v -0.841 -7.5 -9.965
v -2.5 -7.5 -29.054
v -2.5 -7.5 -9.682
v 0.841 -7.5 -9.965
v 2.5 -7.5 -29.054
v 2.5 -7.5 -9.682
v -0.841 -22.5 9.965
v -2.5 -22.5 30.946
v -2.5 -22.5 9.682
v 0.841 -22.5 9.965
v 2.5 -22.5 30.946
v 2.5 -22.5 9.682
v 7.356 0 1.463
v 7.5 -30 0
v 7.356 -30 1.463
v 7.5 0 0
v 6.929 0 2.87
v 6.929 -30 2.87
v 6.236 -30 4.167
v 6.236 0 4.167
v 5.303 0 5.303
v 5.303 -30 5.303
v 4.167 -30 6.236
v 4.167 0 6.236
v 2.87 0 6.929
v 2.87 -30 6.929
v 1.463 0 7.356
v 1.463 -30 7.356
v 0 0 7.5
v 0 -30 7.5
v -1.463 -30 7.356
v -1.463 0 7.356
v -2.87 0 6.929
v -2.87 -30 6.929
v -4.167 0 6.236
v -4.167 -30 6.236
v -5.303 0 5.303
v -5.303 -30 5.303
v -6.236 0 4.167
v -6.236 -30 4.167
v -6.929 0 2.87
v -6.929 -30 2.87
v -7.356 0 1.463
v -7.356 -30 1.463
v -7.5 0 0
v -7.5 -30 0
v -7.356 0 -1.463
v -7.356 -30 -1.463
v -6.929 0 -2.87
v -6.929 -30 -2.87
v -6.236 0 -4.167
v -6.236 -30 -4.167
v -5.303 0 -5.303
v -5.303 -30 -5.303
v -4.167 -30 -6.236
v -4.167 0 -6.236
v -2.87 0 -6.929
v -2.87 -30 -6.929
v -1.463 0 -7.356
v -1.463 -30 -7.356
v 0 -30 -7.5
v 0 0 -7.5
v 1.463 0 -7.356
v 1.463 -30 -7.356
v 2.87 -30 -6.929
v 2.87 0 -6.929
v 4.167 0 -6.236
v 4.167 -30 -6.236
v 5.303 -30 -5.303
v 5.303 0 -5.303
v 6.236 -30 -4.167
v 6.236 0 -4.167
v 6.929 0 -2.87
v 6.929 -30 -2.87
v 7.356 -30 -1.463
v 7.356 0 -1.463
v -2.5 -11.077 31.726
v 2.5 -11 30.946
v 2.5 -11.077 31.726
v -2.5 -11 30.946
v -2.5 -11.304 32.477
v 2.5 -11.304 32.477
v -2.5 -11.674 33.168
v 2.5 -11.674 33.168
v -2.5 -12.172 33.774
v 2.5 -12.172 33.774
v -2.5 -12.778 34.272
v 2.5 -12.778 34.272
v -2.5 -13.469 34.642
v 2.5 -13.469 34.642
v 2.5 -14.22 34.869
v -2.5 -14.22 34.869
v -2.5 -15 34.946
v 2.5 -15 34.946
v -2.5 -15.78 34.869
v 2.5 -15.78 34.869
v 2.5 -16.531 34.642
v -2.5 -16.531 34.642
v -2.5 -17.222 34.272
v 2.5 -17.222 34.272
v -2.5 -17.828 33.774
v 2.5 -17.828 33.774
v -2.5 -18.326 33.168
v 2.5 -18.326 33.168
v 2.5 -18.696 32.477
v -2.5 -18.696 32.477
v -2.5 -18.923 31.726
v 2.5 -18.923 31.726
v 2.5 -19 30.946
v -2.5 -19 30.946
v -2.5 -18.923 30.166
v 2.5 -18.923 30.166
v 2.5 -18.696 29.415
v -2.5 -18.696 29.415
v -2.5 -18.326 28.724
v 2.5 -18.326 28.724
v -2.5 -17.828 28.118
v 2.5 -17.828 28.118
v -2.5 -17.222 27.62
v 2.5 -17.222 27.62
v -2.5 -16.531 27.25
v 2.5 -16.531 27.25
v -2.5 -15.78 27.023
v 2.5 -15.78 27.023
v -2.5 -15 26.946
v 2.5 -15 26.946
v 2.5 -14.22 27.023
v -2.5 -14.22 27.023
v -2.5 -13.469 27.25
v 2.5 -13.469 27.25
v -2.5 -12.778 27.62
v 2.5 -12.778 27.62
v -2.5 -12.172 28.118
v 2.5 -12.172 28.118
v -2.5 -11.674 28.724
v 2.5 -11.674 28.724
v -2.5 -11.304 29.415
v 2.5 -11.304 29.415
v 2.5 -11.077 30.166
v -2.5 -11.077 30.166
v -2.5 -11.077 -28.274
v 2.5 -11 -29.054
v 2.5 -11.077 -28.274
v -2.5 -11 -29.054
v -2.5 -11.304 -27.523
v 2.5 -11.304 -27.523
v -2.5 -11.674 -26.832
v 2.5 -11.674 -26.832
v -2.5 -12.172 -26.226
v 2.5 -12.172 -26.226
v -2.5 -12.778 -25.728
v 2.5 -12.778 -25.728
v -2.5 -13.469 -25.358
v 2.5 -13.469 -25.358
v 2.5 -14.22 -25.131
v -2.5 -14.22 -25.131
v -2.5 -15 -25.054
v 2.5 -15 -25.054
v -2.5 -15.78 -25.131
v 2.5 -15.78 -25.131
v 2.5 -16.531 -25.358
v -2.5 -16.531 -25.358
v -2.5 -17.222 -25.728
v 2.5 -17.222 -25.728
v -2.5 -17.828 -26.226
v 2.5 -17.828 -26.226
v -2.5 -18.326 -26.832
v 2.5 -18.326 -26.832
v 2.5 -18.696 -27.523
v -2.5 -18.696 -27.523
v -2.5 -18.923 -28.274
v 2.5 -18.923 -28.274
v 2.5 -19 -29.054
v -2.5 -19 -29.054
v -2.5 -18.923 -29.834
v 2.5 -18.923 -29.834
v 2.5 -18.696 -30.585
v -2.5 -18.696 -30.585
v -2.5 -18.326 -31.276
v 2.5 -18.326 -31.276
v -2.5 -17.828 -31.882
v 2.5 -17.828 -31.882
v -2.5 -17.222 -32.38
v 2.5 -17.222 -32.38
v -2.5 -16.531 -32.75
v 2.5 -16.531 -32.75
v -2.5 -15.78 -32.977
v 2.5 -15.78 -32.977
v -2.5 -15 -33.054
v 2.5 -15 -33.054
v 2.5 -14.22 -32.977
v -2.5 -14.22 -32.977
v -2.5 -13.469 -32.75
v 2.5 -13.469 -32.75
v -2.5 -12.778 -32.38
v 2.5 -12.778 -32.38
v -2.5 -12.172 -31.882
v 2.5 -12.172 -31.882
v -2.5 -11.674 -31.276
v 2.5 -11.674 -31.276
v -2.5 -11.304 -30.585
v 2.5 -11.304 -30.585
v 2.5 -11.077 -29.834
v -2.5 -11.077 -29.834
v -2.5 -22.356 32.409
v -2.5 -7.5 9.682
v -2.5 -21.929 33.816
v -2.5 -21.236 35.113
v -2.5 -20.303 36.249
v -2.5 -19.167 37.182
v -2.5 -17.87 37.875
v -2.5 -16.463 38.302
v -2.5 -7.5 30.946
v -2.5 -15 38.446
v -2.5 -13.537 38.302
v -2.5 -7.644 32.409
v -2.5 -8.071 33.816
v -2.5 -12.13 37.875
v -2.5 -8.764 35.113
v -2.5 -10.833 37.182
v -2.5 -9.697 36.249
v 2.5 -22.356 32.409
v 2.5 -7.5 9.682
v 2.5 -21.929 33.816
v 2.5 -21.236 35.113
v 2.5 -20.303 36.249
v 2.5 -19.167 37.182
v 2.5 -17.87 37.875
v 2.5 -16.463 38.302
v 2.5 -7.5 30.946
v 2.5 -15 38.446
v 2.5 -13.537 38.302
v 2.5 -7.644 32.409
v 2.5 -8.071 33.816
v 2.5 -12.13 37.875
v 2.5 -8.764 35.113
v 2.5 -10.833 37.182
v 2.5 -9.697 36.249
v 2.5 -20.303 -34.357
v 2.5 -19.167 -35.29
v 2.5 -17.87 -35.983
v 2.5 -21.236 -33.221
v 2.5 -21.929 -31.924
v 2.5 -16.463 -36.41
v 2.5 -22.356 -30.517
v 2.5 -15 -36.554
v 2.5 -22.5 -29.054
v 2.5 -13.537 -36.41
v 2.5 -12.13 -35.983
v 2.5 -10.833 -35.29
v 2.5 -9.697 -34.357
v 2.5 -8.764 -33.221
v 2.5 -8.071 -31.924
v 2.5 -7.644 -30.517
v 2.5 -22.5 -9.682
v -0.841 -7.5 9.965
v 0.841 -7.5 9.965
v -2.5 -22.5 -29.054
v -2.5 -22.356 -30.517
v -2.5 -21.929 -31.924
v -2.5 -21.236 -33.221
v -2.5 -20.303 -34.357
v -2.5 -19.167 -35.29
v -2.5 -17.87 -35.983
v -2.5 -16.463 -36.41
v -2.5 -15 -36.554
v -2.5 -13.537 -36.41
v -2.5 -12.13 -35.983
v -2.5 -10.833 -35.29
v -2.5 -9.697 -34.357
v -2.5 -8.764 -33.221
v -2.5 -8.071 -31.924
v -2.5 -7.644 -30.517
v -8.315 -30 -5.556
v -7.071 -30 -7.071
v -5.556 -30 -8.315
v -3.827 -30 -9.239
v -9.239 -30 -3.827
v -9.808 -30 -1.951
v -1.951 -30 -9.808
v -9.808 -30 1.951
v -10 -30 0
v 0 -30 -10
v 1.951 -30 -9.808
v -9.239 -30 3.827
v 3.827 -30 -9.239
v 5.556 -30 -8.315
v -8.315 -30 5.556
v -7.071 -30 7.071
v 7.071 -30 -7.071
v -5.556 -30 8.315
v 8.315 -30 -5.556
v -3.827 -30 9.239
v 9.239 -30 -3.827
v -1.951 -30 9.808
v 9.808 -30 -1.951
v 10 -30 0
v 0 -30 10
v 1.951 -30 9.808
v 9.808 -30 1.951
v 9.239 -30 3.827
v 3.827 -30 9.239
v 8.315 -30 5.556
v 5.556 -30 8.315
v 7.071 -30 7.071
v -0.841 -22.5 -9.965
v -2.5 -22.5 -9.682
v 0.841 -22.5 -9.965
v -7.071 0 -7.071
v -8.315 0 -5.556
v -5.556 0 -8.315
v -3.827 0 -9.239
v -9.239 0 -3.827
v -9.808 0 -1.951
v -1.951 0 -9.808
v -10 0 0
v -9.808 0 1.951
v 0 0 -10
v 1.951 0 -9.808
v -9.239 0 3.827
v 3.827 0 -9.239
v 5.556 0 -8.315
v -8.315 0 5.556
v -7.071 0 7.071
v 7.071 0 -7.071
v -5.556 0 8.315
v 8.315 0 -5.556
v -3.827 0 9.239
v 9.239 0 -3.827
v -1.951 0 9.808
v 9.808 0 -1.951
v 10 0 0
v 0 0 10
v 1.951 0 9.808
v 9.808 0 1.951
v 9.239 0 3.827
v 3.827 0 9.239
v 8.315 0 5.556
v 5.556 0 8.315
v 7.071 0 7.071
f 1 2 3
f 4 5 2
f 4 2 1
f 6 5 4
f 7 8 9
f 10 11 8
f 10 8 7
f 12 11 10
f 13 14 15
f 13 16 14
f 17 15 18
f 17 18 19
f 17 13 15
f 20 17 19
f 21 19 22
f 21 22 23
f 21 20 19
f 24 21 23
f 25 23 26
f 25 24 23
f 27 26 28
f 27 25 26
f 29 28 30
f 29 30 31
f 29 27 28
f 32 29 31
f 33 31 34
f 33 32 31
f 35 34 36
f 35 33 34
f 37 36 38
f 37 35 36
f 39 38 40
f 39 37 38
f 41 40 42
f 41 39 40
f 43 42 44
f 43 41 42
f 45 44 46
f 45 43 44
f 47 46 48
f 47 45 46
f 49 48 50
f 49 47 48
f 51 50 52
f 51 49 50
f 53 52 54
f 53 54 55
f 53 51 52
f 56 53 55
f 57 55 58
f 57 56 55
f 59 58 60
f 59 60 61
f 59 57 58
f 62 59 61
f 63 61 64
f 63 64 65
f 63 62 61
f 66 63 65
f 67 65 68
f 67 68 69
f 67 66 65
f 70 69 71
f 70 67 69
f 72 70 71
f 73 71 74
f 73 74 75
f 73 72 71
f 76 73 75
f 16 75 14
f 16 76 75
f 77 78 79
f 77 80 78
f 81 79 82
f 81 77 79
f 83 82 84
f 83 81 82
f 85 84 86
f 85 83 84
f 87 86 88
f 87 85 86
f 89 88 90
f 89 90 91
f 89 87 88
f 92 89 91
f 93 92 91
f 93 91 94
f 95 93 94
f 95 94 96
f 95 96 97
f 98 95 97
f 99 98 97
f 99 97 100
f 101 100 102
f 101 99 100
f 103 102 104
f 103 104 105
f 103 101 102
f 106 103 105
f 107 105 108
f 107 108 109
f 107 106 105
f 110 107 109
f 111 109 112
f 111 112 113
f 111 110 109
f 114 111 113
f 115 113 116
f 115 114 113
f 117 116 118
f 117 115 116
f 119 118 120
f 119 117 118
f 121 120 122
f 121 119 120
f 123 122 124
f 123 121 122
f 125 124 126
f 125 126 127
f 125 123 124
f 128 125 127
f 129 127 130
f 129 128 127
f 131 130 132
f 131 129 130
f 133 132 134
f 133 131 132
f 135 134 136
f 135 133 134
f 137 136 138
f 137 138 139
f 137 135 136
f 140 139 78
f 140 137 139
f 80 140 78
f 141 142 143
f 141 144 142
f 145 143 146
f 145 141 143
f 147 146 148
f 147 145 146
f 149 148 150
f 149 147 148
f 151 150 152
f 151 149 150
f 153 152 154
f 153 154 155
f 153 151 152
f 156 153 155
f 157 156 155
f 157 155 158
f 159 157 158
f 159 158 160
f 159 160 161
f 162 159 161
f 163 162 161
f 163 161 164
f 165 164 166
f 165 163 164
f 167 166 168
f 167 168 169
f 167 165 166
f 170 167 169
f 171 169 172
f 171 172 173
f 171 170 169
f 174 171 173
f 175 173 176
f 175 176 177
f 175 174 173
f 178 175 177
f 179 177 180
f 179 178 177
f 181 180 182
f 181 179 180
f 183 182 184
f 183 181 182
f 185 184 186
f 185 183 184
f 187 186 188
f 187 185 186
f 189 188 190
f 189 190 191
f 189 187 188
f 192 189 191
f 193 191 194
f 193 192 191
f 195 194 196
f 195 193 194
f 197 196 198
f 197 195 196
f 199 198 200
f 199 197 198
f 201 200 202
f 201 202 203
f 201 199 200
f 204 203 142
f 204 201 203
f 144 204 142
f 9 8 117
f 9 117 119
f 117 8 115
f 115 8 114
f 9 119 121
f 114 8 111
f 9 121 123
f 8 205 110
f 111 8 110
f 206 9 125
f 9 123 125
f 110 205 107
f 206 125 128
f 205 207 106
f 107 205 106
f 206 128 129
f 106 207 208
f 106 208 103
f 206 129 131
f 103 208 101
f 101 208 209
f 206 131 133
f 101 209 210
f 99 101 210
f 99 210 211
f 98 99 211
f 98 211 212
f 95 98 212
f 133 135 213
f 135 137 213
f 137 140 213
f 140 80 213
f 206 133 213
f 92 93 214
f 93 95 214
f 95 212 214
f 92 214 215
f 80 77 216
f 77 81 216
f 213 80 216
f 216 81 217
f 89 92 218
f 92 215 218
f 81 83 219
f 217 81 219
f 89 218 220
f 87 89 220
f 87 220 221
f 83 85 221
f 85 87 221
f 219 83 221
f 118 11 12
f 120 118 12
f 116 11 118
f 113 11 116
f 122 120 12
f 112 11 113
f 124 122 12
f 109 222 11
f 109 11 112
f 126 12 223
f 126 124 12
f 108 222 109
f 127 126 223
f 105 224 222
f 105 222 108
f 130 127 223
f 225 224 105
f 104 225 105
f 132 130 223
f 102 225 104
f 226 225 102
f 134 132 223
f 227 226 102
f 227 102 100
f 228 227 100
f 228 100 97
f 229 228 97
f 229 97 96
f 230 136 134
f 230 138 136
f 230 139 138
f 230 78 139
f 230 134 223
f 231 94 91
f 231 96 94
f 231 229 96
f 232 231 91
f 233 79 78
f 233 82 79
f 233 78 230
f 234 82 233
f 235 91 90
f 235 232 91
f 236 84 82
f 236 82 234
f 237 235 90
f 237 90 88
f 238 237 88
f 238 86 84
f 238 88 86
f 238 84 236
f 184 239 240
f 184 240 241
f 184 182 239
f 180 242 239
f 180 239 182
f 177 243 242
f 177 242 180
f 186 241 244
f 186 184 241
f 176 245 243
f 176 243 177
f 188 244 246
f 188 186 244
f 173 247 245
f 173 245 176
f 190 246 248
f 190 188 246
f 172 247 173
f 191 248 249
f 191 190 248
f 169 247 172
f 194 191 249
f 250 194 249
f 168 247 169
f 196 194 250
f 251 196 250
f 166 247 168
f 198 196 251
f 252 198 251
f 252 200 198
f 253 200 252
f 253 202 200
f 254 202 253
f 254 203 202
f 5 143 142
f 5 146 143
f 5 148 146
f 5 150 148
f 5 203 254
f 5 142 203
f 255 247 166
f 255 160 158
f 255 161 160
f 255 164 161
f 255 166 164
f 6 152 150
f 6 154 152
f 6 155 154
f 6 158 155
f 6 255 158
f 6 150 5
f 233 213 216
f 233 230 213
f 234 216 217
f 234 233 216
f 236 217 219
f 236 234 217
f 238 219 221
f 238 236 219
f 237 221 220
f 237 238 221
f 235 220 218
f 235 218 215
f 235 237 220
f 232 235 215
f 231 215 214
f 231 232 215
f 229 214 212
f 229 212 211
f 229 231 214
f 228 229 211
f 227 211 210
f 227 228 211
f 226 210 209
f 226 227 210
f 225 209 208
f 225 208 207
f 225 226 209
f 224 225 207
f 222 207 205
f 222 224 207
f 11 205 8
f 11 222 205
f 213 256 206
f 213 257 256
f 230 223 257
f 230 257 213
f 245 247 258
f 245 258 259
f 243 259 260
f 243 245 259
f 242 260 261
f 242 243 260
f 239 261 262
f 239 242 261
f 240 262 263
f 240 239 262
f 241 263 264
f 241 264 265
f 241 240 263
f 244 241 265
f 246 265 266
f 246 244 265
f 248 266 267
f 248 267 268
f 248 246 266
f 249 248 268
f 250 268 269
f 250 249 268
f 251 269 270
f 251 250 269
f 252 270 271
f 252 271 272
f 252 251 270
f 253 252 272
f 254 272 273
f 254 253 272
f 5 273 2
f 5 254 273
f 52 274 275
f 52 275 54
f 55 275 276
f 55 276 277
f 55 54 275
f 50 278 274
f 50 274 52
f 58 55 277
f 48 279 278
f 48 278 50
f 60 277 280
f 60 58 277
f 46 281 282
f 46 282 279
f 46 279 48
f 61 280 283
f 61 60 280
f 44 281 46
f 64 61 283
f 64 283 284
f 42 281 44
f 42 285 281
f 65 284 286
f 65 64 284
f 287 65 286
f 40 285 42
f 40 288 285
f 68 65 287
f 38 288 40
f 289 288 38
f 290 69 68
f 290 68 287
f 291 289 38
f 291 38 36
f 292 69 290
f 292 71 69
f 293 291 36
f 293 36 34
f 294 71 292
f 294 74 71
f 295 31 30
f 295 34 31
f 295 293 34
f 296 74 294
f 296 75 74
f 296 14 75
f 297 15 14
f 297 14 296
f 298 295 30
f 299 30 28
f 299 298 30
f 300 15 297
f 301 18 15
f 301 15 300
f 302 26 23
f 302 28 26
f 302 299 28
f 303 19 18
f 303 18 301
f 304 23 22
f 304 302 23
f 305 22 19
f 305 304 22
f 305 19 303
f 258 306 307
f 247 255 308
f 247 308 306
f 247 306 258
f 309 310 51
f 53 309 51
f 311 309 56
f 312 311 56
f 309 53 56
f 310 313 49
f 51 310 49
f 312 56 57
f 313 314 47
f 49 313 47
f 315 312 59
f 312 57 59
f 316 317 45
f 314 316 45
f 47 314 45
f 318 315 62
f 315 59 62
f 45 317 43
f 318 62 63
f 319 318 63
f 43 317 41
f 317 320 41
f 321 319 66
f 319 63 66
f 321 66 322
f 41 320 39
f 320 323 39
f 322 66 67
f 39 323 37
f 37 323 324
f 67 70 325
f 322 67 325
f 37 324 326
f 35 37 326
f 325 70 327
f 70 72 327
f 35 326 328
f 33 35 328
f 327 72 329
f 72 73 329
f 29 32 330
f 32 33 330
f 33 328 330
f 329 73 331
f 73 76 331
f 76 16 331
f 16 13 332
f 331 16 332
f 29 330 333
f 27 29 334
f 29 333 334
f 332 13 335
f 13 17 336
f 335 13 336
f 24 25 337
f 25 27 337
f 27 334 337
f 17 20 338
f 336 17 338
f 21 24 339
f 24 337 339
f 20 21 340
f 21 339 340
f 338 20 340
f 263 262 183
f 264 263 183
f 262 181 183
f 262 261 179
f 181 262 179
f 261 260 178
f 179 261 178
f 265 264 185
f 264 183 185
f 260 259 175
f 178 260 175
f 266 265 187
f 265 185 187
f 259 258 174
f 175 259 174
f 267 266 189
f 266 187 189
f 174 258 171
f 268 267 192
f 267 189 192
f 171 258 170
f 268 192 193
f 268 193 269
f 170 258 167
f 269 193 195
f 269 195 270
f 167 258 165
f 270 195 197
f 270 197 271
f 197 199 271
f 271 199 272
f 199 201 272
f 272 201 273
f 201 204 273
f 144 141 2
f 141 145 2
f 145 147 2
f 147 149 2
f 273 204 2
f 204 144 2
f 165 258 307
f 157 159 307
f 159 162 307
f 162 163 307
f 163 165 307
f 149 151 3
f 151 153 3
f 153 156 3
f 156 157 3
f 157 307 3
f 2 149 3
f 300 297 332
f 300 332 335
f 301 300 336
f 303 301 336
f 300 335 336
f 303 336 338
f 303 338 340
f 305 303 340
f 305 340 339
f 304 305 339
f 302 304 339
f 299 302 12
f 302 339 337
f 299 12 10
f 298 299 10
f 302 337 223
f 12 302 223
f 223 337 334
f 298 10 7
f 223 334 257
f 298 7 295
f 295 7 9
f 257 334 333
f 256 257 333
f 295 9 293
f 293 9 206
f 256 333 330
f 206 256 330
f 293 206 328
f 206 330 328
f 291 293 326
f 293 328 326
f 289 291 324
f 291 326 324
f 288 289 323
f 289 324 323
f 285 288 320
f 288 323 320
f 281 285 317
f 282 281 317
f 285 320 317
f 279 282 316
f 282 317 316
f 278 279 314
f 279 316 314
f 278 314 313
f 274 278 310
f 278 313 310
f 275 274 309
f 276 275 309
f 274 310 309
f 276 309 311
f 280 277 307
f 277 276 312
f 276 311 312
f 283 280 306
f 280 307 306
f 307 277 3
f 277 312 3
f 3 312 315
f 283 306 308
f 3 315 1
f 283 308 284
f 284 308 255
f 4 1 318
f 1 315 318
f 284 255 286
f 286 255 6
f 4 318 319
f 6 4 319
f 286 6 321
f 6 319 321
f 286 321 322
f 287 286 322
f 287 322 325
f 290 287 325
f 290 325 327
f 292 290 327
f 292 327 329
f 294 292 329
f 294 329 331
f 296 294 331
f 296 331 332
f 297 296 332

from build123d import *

# Parameters (mm, degrees)
F0_R     = 10
F0_R_2   = 7.5
F1_DEPTH = 30
F2_R     = 4
F3_DEPTH = 2.5
F4_R     = 7.5
F5_DEPTH = 30.001


with BuildPart() as f1:
    # F0 (on Front) → F1 (new body)
    with BuildSketch(Plane.XZ):
        Circle(F0_R)
        Circle(F0_R_2, mode=Mode.SUBTRACT)
    extrude(amount=F1_DEPTH)

    # F2 (on Right) → F3 (join, symmetric)
    with BuildSketch(Plane.YZ):
        with BuildLine():
            Line((-22.5, 0.945997), (-7.5, 0.945997))
            Line((-7.5, 0.945997), (-7.5, 30.945997))
            ThreePointArc((-7.5, 30.945997), (-15, 38.445997), (-22.5, 30.945997))
            Line((-22.5, 30.945997), (-22.5, 0.945997))
        make_face()
        with Locations((-15, 30.945997)):
            Circle(F2_R, mode=Mode.SUBTRACT)
        with BuildLine():
            Line((-7.5, -29.054003), (-7.5, 0.945997))
            Line((-7.5, 0.945997), (-22.5, 0.945997))
            Line((-22.5, 0.945997), (-22.5, -29.054003))
            ThreePointArc((-22.5, -29.054003), (-15, -36.554003), (-7.5, -29.054003))
        make_face()
        with Locations((-15, -29.054003)):
            Circle(F2_R, mode=Mode.SUBTRACT)
    extrude(amount=F3_DEPTH, both=True)

    # F4 (on face) → F5 (cut, through all)
    with BuildSketch(Plane.XZ.offset(30)):
        Circle(F4_R)
    extrude(amount=-F5_DEPTH, mode=Mode.SUBTRACT)


solid = f1.part
